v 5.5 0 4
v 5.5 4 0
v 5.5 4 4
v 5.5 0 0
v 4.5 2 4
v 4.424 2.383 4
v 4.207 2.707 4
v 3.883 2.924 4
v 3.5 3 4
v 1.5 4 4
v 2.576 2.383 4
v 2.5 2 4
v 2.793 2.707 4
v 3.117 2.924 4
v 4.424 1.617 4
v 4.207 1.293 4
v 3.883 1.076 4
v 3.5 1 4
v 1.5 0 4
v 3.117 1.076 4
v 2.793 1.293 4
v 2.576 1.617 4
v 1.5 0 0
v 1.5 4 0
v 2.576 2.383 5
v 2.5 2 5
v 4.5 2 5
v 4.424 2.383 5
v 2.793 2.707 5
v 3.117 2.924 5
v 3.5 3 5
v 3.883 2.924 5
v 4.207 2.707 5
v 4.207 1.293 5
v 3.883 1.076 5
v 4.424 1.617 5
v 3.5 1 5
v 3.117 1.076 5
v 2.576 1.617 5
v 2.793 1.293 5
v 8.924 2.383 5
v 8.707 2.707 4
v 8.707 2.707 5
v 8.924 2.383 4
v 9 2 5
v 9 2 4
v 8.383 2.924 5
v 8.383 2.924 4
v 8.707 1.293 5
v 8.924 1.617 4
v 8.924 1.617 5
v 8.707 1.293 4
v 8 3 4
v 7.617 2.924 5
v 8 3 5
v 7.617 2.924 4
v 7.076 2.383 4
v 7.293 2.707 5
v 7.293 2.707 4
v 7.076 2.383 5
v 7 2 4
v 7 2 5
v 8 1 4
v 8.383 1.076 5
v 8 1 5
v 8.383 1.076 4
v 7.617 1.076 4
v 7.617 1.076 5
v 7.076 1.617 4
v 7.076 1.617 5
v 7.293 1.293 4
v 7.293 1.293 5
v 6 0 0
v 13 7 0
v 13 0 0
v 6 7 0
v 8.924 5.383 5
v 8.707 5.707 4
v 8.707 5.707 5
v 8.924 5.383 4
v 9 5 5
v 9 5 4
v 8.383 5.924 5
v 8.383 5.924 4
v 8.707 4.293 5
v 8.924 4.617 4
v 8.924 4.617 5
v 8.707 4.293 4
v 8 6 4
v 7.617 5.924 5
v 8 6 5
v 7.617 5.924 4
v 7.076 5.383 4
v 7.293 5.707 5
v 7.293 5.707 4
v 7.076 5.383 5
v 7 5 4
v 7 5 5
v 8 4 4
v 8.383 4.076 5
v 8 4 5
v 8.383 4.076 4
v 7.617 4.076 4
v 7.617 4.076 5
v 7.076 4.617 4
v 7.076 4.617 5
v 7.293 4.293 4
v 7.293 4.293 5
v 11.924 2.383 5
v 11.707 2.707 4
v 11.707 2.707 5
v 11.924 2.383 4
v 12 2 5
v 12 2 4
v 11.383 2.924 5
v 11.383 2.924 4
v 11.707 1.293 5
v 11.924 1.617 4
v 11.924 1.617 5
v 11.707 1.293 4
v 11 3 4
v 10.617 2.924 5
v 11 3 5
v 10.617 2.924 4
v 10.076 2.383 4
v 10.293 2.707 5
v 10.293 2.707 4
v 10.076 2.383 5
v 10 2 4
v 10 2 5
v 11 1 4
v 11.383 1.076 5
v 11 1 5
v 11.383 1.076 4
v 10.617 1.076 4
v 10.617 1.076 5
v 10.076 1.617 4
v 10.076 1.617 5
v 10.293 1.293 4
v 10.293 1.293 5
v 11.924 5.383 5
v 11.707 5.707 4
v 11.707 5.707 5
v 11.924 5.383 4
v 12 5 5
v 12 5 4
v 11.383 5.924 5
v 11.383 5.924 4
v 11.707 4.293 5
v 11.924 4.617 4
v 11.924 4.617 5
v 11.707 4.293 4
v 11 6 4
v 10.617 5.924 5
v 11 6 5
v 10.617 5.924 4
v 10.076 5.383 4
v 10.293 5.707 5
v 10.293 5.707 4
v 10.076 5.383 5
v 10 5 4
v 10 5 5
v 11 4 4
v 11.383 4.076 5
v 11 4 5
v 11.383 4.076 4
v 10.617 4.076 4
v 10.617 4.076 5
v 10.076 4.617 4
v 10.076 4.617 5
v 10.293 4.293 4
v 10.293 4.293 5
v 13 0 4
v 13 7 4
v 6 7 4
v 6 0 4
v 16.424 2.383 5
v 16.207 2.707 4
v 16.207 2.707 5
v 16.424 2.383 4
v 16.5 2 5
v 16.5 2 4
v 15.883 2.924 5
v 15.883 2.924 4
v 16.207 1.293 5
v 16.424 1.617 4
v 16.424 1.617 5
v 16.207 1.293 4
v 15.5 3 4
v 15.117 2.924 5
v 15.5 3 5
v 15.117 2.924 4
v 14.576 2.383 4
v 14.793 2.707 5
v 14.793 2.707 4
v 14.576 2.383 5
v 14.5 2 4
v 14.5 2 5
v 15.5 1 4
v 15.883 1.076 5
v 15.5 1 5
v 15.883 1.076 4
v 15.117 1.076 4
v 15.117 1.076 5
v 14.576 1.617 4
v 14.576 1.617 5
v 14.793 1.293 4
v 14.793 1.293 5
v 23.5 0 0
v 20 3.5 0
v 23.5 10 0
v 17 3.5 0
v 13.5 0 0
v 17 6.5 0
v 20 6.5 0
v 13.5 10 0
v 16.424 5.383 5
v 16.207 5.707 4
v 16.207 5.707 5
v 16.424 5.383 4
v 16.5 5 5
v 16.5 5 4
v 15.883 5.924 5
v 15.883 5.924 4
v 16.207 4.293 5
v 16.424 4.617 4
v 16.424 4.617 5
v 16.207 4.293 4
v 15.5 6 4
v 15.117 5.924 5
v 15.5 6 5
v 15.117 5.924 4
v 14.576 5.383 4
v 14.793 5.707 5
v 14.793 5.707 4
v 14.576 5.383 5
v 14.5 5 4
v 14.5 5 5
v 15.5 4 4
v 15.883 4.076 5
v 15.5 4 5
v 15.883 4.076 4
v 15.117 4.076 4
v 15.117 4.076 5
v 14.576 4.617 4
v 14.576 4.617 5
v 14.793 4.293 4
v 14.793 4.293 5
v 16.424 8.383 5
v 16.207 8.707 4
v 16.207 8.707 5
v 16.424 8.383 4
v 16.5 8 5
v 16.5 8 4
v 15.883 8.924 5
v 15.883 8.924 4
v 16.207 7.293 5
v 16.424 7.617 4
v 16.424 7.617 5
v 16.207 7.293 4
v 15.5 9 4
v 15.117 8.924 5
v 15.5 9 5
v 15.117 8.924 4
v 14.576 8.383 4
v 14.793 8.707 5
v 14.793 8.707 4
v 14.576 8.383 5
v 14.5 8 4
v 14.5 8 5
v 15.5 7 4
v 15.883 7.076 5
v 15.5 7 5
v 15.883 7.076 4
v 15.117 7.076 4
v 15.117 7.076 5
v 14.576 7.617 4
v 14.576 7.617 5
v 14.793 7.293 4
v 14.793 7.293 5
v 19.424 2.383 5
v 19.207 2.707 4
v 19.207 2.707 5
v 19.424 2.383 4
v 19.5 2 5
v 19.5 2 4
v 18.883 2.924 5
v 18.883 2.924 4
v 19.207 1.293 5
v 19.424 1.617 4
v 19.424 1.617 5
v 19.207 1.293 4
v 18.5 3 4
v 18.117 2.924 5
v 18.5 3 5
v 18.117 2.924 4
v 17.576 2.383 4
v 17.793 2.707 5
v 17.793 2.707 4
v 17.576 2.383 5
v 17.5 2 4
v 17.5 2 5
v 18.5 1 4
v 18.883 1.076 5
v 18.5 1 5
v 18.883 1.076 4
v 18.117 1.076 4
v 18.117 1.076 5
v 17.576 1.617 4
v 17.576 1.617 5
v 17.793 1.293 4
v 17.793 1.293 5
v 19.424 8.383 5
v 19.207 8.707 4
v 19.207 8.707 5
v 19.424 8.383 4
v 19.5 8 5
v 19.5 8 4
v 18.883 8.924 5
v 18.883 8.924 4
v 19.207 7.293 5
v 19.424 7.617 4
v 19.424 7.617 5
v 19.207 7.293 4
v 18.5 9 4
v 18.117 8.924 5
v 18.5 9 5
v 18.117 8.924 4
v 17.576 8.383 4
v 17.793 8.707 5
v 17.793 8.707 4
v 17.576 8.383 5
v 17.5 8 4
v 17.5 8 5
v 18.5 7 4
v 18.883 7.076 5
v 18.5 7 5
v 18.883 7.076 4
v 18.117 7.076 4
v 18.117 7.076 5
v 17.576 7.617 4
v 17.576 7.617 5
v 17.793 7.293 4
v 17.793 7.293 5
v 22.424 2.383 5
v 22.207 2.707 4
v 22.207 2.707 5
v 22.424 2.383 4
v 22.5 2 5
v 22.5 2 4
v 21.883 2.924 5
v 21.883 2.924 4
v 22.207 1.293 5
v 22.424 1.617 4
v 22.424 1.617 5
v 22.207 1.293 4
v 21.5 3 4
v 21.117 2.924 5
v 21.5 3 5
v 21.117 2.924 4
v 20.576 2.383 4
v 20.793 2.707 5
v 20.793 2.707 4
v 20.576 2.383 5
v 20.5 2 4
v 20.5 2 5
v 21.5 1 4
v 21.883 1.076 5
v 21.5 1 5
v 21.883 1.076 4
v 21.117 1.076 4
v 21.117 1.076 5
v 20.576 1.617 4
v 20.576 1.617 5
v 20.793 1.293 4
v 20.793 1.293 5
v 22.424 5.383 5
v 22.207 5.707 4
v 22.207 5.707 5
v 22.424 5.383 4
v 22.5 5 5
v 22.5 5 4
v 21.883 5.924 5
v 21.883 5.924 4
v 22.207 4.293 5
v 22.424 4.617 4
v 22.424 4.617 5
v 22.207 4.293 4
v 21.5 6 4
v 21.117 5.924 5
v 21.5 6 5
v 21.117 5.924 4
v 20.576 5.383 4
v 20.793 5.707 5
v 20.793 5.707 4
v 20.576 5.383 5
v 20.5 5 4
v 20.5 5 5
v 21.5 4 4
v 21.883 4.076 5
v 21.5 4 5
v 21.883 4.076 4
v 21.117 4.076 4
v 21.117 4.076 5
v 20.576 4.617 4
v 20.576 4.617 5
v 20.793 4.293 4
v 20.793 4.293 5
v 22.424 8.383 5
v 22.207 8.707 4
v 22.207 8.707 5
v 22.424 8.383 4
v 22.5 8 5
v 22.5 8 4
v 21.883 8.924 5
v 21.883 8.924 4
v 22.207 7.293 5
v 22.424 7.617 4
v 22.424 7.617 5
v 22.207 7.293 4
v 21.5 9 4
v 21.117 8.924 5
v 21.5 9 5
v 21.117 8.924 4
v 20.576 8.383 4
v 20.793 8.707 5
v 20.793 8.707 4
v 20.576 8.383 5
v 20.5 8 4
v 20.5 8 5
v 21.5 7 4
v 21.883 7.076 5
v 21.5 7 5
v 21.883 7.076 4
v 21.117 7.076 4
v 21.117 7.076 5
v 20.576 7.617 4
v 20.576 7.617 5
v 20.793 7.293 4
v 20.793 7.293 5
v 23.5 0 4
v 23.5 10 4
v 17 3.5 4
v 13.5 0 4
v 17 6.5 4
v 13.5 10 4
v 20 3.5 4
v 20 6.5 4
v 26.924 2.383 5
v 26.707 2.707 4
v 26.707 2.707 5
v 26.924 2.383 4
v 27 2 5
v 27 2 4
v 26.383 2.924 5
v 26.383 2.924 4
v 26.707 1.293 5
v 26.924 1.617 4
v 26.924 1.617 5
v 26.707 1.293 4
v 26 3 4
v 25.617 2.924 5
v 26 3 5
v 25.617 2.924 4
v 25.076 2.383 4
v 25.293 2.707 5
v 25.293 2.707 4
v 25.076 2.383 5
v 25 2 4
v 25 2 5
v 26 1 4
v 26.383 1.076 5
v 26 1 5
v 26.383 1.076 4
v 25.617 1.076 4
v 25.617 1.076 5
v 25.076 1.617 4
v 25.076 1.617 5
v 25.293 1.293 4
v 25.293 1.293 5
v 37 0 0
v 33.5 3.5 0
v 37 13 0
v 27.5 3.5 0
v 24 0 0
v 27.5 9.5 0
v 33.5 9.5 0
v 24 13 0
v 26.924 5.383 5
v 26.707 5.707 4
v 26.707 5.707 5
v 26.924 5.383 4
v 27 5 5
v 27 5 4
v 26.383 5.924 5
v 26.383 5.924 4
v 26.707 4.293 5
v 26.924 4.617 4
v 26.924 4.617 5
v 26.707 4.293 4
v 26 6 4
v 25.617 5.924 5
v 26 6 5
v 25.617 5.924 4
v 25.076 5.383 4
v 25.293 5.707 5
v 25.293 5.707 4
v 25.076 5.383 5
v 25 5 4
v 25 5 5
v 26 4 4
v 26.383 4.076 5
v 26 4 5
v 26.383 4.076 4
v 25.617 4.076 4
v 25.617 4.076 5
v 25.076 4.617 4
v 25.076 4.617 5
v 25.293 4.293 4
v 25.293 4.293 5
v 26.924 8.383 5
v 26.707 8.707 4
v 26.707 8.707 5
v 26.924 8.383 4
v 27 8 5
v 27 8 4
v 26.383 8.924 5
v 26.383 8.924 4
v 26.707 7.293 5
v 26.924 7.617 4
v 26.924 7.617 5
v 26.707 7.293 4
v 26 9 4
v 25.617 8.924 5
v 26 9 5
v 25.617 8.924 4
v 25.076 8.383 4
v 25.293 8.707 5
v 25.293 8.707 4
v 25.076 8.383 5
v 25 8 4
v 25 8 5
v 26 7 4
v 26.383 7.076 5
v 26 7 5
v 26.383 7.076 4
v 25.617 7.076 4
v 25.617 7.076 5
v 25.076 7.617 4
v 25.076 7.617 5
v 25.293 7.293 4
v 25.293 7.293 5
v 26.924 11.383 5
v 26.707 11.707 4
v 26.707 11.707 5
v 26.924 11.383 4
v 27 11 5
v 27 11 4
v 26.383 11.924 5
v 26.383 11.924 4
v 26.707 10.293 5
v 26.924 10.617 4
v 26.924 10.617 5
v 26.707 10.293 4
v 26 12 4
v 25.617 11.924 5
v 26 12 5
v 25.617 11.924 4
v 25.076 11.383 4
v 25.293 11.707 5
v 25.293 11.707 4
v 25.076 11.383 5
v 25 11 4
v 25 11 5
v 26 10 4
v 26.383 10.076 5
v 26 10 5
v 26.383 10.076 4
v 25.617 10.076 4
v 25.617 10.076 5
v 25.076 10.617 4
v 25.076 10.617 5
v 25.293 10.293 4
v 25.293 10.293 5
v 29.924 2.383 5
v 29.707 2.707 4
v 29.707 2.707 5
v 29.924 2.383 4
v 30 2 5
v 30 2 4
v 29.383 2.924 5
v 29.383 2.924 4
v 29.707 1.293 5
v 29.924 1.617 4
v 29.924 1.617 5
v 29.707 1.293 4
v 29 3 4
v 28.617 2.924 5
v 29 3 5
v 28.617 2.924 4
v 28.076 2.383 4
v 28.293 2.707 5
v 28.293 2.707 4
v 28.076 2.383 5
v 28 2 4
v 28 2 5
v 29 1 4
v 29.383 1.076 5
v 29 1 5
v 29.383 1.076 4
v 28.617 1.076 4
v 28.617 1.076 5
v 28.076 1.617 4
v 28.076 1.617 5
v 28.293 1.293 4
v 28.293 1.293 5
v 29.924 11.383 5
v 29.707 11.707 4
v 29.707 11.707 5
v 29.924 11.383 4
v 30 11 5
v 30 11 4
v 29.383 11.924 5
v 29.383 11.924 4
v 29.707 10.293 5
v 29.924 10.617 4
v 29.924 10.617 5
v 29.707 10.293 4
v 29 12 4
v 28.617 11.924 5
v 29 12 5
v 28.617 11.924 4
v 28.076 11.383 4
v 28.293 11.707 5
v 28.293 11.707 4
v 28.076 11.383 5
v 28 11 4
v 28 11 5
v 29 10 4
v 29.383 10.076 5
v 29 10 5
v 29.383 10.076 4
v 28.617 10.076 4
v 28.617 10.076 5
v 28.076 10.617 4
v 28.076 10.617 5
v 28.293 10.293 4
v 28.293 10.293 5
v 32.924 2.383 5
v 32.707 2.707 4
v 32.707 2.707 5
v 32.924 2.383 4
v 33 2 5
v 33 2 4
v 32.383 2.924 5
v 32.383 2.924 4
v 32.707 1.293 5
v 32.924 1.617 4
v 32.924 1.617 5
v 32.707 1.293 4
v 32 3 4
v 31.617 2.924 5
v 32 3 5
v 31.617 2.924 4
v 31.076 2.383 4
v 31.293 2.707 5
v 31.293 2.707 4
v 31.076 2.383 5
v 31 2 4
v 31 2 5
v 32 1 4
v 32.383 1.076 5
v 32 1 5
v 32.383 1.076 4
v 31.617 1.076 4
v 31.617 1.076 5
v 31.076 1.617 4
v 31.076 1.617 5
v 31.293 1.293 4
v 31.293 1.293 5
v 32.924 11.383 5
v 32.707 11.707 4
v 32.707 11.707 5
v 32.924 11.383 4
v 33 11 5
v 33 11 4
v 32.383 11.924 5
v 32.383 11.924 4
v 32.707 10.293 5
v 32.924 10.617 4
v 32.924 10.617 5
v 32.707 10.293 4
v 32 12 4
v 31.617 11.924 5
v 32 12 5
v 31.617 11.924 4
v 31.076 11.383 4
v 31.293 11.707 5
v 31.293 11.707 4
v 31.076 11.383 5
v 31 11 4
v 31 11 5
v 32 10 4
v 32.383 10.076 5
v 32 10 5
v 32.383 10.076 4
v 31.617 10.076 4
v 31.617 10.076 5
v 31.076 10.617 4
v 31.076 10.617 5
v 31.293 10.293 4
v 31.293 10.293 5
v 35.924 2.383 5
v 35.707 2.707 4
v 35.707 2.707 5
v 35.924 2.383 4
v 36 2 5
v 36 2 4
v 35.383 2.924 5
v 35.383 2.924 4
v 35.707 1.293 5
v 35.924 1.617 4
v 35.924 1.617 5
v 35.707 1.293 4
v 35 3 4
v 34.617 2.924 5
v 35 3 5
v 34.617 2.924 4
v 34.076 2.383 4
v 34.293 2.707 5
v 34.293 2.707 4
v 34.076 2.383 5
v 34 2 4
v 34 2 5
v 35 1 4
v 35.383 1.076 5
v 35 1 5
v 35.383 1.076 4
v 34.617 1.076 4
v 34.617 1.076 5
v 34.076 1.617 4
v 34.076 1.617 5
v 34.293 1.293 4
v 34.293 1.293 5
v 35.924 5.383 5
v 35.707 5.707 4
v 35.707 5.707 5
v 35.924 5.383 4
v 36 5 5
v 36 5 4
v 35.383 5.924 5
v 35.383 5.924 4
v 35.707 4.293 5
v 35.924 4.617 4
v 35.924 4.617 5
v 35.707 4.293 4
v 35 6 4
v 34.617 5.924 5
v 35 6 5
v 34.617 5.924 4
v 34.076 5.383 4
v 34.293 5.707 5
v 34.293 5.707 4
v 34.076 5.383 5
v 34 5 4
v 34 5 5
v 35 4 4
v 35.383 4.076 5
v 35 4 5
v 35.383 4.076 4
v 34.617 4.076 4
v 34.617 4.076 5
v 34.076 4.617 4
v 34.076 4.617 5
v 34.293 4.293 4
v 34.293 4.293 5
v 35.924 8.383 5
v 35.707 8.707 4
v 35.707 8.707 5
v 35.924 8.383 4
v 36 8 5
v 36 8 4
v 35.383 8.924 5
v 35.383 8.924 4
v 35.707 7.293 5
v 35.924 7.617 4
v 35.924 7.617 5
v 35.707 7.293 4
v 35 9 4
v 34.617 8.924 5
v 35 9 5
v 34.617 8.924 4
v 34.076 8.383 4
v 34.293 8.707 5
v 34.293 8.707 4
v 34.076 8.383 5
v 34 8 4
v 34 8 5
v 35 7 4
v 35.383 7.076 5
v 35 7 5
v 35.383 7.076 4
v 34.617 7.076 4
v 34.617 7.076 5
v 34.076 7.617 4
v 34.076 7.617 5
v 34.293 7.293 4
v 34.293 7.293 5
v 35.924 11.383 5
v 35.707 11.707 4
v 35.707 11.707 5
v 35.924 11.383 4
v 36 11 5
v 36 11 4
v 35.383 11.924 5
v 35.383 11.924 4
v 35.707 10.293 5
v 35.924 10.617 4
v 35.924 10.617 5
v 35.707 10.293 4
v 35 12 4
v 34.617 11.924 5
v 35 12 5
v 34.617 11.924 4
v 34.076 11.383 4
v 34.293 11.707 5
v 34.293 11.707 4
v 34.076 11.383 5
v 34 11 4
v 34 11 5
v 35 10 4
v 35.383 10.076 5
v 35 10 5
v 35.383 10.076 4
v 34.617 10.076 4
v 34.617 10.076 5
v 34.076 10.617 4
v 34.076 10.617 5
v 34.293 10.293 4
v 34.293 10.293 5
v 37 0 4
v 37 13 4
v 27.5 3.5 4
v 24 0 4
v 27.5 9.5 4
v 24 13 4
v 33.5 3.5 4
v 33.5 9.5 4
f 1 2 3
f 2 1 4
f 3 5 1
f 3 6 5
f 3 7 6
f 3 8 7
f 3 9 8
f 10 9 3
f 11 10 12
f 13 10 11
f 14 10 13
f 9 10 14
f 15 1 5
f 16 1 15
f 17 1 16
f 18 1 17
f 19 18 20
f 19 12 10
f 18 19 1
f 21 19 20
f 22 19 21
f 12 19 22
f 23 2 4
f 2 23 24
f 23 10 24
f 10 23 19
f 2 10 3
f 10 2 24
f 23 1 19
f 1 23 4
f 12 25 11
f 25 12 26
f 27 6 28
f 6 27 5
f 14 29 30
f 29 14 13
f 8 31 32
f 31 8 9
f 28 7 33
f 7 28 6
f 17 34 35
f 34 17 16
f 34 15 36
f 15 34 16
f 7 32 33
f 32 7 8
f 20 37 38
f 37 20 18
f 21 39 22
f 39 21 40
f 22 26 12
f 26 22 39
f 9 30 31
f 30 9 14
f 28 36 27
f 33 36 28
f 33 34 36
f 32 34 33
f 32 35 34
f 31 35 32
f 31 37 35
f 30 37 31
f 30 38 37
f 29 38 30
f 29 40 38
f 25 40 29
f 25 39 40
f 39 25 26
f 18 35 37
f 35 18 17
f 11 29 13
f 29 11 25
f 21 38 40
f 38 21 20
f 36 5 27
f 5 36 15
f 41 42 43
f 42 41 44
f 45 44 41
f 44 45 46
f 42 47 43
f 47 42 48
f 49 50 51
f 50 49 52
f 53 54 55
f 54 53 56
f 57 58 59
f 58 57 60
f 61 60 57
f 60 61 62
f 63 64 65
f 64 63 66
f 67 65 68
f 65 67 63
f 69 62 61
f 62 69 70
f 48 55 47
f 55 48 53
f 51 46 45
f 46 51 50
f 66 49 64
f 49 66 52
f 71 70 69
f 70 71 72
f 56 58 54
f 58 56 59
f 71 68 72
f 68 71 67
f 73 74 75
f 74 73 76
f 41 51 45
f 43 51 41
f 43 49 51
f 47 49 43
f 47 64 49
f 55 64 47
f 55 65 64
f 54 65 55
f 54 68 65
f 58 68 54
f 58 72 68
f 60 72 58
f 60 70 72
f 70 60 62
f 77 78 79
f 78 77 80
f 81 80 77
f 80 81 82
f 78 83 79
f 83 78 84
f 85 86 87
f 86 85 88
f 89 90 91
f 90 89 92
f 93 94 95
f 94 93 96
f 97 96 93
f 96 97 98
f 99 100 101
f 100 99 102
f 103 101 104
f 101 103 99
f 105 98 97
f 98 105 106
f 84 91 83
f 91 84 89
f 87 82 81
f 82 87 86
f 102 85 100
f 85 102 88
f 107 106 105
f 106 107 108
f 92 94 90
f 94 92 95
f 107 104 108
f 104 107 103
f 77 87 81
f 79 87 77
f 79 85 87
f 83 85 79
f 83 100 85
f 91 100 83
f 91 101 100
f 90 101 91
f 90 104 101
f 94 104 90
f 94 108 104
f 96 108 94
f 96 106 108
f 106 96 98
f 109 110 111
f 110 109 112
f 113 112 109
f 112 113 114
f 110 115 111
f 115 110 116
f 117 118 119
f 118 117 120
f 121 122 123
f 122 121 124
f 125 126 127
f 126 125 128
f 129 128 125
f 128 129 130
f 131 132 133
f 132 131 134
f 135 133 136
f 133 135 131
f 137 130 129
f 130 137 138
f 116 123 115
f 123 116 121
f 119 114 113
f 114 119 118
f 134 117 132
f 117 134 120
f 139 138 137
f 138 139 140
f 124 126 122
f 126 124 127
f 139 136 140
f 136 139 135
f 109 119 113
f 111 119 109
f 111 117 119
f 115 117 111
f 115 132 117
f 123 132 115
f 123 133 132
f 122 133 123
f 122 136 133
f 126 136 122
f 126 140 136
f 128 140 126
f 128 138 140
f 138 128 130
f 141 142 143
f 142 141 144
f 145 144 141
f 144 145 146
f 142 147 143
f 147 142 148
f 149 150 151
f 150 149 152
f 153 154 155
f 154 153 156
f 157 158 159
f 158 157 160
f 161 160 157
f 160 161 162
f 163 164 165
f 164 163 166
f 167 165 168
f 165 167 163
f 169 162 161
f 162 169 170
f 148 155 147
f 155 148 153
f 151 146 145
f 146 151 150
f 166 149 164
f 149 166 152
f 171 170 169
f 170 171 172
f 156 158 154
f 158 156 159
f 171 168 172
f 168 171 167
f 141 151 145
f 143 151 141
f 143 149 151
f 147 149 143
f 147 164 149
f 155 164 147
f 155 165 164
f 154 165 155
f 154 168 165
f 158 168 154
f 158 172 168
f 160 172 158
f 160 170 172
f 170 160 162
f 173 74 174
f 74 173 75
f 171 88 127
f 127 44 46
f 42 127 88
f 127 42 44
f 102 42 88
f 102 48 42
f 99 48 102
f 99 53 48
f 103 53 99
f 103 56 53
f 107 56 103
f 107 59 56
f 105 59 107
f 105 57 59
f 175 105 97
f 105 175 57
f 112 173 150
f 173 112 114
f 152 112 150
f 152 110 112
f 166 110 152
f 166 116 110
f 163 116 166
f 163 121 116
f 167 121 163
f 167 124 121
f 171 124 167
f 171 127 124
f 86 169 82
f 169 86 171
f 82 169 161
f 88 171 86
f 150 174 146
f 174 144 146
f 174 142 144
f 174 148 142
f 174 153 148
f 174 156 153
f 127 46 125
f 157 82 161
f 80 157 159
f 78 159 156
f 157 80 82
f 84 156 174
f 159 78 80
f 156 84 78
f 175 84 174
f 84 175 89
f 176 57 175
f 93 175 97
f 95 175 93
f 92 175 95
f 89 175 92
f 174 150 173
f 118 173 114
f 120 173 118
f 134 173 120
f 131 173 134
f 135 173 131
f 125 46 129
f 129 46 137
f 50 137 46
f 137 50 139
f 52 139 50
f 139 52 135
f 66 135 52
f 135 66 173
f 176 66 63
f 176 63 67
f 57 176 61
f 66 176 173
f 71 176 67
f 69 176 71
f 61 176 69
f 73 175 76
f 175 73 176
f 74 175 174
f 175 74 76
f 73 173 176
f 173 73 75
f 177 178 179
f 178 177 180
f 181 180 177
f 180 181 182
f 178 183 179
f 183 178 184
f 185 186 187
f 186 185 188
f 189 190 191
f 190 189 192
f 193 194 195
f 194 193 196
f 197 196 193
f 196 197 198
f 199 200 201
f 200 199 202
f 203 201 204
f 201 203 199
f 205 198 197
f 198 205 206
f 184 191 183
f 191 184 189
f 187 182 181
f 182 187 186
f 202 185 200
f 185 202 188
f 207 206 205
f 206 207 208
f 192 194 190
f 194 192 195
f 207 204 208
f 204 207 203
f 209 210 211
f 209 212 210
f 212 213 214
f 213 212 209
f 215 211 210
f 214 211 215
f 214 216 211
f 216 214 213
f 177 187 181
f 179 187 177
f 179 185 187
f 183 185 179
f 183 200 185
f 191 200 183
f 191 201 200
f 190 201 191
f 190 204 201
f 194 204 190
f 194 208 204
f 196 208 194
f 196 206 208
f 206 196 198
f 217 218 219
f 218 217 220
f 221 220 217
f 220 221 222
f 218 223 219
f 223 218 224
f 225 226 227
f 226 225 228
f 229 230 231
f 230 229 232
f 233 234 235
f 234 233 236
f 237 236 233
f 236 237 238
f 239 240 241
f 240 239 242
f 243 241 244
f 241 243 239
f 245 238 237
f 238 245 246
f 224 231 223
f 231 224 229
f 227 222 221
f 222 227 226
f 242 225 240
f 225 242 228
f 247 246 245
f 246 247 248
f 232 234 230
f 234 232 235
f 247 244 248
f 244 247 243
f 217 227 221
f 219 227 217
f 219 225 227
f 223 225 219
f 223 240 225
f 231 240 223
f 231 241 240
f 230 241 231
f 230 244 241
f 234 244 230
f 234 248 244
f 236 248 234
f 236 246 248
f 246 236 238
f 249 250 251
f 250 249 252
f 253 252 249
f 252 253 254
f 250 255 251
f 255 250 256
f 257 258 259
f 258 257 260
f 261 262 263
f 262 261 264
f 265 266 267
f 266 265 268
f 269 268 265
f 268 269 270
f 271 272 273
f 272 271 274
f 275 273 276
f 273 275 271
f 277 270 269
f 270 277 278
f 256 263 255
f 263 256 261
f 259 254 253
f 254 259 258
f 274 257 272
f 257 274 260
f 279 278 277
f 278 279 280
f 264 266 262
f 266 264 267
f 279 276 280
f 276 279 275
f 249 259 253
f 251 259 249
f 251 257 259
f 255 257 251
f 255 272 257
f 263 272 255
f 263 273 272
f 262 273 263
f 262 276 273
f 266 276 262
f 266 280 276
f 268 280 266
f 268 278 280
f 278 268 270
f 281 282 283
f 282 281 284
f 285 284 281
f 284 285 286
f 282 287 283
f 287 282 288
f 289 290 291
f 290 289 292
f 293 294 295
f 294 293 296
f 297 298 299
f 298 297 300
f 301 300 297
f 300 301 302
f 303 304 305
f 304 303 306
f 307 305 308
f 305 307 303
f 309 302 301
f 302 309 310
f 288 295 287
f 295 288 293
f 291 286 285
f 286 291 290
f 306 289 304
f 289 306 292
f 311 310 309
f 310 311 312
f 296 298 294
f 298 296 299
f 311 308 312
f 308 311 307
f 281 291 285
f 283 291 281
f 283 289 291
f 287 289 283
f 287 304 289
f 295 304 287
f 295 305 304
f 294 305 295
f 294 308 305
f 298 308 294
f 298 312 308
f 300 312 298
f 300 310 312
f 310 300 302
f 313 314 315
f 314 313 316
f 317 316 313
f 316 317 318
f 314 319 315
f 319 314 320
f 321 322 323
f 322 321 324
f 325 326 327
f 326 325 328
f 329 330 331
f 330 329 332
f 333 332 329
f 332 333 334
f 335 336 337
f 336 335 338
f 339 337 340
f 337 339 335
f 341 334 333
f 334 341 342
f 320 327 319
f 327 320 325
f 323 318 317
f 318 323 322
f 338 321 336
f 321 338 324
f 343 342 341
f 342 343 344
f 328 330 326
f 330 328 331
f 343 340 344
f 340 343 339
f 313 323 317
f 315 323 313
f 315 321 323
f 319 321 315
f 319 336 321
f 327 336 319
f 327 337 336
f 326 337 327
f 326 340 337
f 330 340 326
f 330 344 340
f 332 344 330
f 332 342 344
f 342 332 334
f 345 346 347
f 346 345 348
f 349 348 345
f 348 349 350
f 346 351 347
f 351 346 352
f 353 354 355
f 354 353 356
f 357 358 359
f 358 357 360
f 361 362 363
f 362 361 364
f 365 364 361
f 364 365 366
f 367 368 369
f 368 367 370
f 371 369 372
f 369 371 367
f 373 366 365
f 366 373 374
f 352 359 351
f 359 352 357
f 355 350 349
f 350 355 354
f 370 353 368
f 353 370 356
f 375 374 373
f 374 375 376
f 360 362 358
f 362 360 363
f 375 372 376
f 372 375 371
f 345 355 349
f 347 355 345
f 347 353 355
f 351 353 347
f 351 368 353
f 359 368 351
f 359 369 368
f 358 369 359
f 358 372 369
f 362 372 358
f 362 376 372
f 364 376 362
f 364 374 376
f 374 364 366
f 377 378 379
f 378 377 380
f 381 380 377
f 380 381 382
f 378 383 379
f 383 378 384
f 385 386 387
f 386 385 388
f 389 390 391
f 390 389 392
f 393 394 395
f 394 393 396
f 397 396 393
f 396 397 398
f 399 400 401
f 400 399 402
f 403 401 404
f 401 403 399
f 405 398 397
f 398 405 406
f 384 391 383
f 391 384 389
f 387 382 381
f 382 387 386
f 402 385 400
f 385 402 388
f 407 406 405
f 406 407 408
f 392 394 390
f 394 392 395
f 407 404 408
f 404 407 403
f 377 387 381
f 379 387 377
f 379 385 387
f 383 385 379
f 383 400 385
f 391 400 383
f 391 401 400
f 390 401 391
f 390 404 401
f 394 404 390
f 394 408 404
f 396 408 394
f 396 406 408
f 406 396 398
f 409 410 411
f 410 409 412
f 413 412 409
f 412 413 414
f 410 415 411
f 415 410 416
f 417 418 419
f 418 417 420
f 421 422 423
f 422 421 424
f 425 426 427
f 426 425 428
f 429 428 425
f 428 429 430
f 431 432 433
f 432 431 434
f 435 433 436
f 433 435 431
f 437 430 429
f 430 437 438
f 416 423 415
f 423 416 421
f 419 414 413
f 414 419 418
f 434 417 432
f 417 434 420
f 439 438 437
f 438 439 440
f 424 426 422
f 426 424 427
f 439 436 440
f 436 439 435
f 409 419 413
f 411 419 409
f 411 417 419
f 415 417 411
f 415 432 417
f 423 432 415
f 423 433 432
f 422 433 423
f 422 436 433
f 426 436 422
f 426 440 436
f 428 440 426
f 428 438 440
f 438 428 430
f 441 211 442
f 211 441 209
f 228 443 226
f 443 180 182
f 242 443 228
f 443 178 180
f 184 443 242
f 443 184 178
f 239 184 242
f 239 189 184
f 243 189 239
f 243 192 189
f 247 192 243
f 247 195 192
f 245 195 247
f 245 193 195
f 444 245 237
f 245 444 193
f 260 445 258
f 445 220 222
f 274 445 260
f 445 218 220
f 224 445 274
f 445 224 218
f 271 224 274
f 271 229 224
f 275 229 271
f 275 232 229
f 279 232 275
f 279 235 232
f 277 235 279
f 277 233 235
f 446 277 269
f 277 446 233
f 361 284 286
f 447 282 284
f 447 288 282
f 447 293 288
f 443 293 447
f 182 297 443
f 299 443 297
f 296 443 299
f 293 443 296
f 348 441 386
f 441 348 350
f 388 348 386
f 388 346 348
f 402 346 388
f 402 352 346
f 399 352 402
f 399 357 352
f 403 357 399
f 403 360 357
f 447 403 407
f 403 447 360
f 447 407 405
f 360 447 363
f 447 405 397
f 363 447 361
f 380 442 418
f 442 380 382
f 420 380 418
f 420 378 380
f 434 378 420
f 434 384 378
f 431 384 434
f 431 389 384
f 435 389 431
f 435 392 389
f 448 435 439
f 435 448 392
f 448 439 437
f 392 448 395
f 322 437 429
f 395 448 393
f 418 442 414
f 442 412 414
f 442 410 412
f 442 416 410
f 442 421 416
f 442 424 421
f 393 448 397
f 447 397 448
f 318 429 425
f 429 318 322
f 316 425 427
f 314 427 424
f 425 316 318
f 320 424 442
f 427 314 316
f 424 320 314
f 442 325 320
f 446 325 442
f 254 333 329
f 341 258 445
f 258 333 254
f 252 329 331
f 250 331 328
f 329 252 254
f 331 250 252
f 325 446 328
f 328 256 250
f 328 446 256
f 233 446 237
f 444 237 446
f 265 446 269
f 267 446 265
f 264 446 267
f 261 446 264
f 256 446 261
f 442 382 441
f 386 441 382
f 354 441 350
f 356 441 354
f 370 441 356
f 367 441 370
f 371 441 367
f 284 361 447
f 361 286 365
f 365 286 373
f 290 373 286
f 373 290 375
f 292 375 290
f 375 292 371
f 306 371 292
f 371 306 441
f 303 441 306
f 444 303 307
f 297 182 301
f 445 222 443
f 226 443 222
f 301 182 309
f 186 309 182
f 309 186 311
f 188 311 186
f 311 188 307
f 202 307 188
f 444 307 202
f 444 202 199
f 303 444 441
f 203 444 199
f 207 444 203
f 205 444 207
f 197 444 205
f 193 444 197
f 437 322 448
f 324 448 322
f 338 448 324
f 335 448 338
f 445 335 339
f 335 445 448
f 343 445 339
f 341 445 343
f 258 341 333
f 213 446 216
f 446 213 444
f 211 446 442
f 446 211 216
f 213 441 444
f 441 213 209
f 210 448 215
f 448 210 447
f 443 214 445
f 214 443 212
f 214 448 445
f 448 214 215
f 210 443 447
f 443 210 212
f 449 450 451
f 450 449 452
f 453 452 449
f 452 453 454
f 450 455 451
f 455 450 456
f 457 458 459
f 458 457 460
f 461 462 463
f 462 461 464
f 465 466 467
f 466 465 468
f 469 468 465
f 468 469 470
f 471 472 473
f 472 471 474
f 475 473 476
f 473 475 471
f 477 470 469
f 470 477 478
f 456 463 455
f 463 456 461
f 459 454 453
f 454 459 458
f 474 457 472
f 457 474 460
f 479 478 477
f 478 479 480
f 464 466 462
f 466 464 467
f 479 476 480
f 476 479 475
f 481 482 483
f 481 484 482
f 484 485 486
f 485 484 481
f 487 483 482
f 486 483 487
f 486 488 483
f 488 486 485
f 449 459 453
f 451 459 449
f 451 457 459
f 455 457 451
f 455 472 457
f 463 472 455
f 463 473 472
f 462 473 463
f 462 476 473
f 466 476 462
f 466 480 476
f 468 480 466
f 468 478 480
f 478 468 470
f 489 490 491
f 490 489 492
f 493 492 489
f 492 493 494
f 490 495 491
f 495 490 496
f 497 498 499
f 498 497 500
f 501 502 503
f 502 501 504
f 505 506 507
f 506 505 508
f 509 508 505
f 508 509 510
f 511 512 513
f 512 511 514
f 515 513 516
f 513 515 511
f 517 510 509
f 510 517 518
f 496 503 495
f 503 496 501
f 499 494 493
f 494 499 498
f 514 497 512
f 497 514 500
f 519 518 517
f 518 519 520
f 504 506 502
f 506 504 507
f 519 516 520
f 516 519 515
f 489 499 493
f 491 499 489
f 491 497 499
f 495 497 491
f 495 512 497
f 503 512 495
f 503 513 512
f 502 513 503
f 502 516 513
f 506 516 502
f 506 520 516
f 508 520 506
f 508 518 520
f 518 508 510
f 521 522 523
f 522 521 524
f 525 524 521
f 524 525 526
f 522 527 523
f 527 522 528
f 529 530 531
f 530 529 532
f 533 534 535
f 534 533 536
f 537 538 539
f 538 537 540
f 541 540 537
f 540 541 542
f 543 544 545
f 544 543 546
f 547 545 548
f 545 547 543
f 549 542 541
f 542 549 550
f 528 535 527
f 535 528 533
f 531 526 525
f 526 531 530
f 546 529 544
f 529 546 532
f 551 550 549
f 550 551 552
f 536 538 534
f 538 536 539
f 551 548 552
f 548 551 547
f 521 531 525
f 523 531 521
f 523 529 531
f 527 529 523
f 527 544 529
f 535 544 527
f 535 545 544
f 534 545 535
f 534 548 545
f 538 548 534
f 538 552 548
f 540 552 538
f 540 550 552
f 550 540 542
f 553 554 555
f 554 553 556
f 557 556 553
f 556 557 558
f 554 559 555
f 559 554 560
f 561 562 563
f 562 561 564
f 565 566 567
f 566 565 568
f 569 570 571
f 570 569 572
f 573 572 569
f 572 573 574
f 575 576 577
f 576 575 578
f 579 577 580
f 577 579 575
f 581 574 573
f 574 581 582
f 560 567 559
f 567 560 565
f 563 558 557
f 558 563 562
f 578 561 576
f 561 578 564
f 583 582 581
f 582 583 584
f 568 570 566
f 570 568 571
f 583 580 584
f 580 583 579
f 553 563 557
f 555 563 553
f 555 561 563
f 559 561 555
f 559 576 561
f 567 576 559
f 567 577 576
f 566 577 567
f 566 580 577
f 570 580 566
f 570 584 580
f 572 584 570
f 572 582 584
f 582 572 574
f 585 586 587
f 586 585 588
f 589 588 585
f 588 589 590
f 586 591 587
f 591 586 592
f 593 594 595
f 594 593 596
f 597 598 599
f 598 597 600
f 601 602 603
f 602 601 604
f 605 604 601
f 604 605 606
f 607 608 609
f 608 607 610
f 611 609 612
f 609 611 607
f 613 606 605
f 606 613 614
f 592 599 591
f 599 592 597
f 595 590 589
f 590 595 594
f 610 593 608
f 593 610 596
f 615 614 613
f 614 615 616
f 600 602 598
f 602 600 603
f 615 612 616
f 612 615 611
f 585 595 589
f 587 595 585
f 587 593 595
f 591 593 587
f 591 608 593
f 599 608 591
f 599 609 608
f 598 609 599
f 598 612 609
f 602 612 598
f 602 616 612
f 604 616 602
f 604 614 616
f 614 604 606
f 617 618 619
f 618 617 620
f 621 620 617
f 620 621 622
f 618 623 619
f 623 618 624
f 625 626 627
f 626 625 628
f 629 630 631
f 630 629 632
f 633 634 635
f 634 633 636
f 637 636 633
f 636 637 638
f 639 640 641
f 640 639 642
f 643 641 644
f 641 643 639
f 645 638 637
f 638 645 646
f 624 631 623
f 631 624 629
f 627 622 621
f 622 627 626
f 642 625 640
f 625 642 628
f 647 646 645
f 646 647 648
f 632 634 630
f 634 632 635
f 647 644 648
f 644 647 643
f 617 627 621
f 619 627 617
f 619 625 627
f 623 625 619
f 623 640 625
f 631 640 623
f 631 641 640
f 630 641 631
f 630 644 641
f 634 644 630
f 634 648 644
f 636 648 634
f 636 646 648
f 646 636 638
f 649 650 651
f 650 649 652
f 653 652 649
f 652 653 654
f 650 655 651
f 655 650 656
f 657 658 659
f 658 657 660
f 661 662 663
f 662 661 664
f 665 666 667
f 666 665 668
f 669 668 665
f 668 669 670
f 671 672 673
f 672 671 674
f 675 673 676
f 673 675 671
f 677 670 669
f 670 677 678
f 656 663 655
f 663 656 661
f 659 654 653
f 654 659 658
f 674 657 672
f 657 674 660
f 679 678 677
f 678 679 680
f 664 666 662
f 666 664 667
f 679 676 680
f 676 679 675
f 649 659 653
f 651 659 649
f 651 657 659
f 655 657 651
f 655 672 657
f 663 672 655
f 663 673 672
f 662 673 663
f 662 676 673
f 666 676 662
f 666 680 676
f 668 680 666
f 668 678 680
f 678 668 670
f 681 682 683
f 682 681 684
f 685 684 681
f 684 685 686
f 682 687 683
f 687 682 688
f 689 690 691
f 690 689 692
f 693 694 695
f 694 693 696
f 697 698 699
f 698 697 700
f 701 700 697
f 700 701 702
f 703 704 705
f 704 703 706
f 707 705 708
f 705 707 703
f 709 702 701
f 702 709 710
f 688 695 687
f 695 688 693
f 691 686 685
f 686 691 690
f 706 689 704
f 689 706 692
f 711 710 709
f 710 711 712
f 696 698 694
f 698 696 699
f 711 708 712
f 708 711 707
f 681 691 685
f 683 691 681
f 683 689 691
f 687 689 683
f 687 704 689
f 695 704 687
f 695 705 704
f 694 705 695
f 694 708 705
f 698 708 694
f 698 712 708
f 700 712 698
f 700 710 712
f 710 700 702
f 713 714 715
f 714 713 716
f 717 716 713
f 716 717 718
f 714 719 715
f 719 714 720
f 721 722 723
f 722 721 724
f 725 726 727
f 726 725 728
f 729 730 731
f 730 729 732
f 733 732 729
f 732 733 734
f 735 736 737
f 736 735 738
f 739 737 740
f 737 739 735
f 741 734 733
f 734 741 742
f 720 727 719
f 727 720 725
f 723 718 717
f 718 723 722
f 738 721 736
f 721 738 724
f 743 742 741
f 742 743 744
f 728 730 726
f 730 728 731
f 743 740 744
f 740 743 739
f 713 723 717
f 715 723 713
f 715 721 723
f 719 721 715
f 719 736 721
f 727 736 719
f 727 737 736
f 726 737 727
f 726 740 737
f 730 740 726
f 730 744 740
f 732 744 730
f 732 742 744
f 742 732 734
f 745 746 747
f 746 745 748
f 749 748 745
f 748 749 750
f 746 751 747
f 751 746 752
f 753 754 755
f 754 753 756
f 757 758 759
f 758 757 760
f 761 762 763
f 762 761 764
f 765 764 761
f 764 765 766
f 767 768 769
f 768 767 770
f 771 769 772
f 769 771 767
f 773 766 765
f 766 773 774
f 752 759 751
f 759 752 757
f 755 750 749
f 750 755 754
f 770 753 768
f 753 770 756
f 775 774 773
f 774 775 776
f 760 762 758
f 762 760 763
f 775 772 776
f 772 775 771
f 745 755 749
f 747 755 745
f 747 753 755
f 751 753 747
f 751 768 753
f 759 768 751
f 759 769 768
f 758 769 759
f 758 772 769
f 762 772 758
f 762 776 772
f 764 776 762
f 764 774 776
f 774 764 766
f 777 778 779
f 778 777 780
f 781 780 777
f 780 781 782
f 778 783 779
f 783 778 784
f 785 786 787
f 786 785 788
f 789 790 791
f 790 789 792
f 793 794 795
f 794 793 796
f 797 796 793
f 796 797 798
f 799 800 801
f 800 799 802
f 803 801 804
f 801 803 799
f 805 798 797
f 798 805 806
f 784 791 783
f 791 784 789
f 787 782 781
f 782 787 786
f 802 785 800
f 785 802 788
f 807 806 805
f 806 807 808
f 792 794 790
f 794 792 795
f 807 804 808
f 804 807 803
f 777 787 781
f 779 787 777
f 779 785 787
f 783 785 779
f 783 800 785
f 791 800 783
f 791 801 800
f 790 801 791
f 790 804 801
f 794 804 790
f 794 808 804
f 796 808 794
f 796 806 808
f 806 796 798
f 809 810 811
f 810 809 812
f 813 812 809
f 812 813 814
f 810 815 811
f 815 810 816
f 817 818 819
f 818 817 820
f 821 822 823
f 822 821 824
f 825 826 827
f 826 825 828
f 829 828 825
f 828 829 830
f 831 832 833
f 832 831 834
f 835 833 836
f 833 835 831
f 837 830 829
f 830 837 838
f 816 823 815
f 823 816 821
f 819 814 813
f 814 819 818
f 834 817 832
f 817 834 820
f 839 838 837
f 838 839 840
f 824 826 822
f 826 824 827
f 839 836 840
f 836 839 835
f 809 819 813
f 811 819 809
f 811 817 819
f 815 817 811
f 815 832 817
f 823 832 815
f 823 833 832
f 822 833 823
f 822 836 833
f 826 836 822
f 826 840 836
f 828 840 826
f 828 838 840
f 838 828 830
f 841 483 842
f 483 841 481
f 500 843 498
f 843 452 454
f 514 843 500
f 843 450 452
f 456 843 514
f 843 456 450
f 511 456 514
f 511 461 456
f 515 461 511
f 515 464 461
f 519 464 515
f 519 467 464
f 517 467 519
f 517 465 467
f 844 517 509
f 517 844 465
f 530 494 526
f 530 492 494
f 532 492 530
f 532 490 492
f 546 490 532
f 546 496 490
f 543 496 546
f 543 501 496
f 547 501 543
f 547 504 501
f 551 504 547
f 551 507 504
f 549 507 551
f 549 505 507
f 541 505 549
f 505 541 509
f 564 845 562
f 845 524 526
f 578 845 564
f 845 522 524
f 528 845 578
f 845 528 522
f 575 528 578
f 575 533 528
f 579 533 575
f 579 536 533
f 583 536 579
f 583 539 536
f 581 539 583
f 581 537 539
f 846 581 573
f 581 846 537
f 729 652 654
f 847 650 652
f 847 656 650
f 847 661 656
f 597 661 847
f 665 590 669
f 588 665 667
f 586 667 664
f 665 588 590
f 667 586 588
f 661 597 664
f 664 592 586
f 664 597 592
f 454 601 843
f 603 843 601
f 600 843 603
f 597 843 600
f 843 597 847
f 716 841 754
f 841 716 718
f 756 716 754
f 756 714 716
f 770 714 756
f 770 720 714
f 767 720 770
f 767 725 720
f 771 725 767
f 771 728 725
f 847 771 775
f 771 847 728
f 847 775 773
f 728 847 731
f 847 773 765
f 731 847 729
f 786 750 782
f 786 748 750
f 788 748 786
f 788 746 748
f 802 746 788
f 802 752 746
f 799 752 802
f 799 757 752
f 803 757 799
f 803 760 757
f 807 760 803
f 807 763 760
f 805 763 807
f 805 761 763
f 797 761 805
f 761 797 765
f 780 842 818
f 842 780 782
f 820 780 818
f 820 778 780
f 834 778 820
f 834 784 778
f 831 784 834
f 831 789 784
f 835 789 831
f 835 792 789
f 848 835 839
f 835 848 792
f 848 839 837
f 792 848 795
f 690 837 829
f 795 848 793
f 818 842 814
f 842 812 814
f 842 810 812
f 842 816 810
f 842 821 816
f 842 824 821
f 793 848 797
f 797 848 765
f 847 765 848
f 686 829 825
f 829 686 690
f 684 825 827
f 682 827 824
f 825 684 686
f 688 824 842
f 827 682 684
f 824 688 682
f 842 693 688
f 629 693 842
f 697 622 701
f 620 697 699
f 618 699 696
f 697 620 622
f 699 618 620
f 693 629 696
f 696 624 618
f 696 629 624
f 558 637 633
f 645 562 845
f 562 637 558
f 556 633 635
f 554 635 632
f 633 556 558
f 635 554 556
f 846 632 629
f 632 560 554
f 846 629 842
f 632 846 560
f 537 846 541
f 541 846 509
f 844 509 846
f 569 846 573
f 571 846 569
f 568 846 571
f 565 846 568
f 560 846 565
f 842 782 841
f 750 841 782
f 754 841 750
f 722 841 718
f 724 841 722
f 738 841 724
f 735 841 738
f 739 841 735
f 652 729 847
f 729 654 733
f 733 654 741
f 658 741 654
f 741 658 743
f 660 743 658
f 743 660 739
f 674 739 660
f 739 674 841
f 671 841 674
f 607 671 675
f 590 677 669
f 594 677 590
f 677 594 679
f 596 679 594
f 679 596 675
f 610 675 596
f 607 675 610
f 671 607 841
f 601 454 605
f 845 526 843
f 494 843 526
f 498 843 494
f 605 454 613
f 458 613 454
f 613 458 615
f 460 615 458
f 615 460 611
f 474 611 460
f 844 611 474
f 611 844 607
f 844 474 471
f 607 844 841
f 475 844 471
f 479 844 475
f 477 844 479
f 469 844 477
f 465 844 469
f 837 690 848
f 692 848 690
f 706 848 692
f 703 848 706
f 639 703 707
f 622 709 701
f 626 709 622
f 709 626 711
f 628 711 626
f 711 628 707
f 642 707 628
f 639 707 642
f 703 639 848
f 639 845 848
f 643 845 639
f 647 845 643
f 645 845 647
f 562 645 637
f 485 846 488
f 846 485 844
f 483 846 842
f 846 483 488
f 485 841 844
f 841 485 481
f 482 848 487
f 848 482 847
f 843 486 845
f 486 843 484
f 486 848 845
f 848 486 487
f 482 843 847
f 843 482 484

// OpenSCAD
module Hole_Lego(DotsPerRow){

    DotEnd=2+(DotsPerRow-1)*3;
    length=DotEnd+2;
    
    difference(){
        union(){
            cube ([length,length,4]);
            for(Xposition=[2: 3: DotEnd]){
              for(Yposition=[2: 3: DotEnd]){
               translate ([Xposition,Yposition,0]) cylinder(h=5, r=1, $fn=16);
              }
            }
        }
       
        if(DotsPerRow>2) 
            translate([length/2,length/2,2])cube([length-7,length-7,7], center=true);
    }
}

for(size=[1:1:4]){
  translate([(size)*(1.5*size),0,0]) Hole_Lego(size);
}
    
